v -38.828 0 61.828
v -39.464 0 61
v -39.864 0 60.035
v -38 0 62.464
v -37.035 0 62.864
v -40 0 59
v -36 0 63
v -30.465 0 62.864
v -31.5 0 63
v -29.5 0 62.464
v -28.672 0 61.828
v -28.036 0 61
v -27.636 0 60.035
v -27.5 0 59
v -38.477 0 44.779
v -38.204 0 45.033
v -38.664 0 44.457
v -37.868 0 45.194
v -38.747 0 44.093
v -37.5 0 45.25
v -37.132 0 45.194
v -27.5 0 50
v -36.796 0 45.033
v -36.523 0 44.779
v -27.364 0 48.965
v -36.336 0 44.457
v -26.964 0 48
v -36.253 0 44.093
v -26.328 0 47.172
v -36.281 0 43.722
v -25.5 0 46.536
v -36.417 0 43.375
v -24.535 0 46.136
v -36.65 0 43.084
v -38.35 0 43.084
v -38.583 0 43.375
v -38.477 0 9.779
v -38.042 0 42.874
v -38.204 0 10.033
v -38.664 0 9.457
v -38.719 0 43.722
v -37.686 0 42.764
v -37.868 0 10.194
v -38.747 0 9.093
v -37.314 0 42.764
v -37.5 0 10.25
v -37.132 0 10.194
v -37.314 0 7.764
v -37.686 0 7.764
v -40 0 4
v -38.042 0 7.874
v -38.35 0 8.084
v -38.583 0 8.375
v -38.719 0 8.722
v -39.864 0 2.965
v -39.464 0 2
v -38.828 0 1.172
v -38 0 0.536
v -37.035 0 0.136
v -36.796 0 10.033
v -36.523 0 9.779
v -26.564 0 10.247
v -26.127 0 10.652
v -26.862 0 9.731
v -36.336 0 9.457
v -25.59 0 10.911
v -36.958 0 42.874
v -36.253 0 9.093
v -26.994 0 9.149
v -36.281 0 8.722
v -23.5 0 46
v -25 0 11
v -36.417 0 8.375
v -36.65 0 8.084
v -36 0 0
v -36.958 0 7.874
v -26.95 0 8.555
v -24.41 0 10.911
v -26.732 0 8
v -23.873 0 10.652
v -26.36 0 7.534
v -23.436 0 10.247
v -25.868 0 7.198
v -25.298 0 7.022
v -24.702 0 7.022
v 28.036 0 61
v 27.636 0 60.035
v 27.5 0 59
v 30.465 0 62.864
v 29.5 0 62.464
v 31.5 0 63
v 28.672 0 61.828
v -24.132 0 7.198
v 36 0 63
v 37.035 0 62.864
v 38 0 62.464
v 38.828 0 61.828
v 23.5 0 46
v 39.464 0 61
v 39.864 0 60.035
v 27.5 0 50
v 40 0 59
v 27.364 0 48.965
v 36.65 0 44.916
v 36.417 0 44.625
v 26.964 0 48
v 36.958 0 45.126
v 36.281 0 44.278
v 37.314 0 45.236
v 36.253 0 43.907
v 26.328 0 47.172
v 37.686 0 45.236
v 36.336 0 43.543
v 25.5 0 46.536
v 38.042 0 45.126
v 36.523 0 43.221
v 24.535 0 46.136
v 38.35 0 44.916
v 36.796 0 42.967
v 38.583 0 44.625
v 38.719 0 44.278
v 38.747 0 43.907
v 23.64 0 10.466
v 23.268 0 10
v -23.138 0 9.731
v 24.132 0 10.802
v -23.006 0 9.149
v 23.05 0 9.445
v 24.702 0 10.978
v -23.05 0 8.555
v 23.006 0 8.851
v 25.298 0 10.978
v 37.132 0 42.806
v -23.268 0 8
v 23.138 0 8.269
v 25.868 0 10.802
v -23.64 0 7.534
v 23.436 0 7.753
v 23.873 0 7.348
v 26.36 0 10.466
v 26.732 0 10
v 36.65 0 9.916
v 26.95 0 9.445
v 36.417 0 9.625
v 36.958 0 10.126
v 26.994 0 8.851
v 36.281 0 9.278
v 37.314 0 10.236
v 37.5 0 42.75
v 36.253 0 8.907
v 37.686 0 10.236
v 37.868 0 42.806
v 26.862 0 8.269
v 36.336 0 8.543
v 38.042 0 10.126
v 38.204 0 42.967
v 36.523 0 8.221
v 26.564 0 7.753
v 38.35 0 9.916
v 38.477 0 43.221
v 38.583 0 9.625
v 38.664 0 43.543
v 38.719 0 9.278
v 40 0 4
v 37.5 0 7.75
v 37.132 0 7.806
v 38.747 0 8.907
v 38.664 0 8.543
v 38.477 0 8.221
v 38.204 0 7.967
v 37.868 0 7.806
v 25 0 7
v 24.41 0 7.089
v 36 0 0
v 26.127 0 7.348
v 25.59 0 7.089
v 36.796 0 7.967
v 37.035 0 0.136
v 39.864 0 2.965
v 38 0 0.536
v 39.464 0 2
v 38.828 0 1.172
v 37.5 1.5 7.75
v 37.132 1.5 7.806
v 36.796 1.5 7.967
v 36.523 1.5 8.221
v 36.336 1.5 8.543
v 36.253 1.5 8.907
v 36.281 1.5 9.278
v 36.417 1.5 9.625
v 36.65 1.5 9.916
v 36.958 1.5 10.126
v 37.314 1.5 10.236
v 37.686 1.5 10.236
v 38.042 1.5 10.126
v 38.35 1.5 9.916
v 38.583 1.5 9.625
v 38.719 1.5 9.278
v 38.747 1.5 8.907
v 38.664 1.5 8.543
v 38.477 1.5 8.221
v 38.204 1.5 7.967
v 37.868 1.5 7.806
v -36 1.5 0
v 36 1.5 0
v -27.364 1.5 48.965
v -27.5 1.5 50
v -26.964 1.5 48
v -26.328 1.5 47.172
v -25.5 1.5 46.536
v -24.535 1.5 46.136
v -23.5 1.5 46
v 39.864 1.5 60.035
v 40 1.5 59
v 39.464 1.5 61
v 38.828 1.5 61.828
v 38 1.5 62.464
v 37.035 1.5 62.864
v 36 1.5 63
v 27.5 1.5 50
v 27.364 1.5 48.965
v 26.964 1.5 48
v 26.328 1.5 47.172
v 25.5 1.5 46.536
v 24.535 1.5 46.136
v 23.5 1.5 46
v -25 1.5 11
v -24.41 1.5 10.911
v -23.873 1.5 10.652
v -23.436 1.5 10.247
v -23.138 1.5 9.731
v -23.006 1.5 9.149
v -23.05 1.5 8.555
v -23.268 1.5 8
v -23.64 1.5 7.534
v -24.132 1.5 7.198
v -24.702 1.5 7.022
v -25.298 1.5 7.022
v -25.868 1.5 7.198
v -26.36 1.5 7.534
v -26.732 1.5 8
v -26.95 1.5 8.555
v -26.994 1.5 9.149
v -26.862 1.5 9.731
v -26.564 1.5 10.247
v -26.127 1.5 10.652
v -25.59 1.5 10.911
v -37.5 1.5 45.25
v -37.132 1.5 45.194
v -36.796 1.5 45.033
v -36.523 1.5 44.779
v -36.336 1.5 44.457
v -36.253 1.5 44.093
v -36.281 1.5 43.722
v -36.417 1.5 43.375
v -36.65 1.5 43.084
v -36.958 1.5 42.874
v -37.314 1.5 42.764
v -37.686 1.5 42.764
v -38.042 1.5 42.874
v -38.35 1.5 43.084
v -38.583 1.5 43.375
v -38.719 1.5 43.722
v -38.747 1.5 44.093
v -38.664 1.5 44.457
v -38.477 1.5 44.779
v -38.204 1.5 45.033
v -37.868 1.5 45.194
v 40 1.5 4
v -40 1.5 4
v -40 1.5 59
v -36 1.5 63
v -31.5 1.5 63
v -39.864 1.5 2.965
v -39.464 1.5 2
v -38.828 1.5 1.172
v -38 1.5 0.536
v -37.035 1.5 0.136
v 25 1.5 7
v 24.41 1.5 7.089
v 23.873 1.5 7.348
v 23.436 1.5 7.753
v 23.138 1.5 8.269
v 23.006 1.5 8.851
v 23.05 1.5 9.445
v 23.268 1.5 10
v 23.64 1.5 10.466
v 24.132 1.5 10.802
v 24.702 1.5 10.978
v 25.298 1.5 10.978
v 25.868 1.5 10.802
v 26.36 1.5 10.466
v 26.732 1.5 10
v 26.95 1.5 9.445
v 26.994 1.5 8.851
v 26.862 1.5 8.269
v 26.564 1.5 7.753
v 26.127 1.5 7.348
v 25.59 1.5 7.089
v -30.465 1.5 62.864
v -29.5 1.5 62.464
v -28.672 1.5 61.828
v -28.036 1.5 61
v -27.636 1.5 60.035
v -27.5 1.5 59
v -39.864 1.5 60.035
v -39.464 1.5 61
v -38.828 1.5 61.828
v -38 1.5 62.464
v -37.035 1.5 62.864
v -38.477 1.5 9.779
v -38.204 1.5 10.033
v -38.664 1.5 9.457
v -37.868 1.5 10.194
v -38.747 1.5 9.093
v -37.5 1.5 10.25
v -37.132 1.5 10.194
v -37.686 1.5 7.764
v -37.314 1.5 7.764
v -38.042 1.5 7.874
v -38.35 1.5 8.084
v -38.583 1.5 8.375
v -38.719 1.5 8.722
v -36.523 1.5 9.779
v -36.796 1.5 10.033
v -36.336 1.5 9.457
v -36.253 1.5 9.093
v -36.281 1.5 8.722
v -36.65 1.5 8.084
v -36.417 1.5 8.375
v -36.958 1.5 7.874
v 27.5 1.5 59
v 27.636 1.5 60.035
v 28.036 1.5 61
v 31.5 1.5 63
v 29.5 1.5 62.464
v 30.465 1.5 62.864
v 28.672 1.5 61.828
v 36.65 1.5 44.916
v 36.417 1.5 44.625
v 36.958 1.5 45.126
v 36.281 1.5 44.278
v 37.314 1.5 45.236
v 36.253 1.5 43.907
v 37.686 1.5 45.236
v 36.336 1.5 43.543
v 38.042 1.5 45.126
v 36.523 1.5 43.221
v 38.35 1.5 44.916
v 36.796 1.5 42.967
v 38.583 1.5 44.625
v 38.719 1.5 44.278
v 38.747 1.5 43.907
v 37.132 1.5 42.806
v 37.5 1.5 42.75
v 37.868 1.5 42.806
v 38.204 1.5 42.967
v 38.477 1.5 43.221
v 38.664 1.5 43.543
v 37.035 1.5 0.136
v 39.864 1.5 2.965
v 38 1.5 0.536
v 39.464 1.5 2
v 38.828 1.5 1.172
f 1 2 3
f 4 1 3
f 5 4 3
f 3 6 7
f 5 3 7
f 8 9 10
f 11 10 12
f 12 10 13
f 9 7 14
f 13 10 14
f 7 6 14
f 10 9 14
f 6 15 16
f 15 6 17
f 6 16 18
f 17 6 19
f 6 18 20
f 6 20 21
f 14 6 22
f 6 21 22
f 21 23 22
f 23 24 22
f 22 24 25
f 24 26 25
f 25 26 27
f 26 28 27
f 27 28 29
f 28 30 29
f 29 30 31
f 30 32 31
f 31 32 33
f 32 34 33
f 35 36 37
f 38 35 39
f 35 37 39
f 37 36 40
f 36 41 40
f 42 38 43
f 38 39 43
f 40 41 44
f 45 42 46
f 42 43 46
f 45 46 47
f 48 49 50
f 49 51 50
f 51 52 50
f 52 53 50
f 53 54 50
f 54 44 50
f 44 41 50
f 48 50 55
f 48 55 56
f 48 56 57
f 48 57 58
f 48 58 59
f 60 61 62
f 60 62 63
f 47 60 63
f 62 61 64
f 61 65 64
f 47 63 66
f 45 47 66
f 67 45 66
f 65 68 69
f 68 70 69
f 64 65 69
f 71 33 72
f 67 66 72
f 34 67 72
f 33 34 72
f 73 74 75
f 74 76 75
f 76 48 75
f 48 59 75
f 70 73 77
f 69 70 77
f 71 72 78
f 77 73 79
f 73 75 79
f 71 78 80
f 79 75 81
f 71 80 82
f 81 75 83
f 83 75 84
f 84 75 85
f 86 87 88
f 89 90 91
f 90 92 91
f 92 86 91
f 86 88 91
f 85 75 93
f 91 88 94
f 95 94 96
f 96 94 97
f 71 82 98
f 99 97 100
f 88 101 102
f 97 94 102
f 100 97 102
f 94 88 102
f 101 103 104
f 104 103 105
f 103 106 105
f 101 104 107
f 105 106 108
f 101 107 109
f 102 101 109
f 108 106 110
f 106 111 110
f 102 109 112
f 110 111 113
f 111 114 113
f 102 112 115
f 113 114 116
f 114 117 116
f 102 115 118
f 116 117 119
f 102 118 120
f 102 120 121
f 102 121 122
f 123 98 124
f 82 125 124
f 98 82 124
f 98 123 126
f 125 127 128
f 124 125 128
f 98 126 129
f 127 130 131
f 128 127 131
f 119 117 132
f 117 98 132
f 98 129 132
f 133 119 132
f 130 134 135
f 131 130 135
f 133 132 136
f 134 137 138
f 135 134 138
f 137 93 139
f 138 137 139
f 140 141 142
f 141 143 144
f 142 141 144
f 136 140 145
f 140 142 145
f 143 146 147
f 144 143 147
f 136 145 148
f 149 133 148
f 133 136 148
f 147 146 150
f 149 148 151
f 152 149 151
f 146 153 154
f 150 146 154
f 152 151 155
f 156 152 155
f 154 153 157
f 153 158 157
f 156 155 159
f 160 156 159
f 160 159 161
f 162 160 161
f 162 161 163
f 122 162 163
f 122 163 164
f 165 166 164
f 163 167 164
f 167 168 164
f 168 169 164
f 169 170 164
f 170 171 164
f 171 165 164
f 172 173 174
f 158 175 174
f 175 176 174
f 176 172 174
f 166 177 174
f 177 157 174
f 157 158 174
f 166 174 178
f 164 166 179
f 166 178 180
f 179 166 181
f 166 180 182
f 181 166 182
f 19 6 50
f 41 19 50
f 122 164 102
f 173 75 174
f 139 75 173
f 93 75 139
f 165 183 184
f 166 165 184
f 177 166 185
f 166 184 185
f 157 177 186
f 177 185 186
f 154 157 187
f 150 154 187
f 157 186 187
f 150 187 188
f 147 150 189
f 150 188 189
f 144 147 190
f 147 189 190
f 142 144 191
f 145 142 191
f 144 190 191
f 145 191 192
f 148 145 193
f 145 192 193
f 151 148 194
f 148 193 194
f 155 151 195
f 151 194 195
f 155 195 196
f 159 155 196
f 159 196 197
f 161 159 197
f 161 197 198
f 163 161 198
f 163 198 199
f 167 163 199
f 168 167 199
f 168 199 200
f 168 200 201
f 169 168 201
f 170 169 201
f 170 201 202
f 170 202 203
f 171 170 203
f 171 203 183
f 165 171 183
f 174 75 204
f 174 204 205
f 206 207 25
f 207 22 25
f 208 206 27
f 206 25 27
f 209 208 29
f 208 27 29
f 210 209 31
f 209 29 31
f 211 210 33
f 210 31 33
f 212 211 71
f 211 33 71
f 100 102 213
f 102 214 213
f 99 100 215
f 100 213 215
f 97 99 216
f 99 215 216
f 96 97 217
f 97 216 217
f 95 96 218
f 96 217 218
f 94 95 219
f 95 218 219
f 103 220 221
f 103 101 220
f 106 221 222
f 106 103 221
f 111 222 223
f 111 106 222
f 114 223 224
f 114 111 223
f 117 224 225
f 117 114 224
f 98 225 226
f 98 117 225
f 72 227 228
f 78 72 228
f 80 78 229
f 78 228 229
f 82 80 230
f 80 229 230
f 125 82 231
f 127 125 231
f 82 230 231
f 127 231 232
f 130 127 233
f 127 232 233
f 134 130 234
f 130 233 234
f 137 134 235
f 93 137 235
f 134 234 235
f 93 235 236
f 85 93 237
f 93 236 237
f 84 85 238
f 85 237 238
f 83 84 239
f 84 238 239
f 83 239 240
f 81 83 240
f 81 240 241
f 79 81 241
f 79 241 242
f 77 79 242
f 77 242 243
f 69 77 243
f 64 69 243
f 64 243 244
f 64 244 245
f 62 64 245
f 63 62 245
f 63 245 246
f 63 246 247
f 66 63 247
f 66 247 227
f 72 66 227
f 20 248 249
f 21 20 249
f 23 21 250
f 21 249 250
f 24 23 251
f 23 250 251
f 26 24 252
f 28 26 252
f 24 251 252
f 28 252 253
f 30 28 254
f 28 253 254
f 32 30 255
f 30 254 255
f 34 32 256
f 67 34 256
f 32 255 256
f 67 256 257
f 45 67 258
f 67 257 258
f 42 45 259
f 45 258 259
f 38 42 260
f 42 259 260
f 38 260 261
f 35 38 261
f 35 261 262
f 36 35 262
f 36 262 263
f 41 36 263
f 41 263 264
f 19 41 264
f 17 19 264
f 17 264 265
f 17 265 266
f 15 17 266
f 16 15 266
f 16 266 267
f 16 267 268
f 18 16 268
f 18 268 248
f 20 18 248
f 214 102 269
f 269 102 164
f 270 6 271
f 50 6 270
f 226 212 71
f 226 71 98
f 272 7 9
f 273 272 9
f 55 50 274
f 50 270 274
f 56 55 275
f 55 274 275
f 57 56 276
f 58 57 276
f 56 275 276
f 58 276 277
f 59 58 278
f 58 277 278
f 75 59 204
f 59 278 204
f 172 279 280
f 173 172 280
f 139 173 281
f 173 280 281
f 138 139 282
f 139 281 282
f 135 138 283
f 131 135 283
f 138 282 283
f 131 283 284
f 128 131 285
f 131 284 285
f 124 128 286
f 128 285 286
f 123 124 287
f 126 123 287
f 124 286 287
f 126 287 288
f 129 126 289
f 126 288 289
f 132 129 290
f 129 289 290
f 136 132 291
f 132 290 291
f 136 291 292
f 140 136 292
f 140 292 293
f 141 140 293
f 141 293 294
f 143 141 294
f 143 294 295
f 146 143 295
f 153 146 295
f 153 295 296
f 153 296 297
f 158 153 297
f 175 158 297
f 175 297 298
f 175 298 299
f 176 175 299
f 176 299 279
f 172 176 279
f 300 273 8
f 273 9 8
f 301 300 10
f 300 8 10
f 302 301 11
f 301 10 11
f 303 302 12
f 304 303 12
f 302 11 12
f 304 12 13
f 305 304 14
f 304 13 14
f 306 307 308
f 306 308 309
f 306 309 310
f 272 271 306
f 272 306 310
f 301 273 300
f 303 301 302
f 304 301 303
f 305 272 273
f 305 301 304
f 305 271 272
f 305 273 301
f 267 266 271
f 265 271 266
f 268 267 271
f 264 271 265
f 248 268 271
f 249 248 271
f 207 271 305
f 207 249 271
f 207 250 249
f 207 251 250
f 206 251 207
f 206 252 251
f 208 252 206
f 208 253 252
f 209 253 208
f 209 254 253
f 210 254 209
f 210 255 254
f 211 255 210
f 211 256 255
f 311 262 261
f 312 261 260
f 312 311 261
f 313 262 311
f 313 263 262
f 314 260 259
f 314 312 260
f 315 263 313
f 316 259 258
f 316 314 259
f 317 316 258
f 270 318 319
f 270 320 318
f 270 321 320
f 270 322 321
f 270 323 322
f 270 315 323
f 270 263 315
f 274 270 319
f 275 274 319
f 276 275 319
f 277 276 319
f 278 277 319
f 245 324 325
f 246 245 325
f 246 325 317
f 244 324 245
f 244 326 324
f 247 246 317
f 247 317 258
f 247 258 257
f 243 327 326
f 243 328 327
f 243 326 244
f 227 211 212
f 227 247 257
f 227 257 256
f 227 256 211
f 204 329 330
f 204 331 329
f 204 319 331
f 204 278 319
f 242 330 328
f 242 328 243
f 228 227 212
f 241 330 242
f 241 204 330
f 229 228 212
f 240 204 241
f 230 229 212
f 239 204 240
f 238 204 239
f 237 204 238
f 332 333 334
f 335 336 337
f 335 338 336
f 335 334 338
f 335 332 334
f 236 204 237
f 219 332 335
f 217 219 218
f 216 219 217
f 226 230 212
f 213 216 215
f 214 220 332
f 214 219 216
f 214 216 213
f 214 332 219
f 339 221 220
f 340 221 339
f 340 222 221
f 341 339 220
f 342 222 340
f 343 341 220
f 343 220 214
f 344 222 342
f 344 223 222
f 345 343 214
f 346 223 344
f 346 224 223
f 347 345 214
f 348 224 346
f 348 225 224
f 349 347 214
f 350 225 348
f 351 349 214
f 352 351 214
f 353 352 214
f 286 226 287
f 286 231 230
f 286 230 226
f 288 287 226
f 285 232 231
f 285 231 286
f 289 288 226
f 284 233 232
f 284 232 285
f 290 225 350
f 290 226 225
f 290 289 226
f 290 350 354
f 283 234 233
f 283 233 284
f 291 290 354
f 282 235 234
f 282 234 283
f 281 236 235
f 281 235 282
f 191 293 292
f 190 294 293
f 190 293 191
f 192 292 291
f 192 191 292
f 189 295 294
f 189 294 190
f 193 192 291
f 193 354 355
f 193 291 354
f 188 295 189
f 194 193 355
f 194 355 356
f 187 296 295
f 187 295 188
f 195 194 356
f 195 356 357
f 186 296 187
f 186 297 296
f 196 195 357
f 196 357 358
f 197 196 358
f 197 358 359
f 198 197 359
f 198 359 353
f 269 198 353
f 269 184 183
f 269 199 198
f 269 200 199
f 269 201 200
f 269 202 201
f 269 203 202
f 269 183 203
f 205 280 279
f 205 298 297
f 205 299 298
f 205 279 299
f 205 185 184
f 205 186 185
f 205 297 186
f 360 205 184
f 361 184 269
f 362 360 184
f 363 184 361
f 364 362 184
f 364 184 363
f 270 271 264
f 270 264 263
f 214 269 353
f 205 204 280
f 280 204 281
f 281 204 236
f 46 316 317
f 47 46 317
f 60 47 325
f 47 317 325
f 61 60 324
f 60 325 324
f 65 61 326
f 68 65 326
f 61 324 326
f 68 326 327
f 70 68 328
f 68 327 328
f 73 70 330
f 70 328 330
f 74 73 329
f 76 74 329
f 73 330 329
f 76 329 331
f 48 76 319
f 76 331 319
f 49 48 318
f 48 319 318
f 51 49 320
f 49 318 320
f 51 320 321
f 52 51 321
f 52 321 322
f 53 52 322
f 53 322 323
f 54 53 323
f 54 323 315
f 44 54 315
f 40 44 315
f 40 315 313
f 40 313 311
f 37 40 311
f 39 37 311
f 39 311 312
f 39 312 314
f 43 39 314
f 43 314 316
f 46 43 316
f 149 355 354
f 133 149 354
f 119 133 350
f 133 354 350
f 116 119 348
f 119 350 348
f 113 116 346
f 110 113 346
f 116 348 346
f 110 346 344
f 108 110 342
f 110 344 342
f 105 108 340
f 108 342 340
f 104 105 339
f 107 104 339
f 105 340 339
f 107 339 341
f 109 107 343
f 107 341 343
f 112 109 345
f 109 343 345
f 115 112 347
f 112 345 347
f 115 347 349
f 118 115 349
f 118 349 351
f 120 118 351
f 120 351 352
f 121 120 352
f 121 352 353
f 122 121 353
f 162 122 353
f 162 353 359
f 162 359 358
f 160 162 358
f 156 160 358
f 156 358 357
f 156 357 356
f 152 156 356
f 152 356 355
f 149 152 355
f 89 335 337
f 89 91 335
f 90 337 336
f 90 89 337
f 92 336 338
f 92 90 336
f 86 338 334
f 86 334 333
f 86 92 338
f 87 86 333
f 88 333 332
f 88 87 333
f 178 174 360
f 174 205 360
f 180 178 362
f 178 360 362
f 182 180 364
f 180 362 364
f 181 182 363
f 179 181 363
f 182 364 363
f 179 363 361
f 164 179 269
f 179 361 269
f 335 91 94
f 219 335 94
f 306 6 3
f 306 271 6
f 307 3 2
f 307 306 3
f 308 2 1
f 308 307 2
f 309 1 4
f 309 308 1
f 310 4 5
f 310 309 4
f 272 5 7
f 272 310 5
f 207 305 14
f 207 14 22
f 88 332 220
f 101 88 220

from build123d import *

# Parameters (mm, degrees)
ESQUISSE1_W             = 80
ESQUISSE1_H             = 63
BOSS_EXTRU_1_DEPTH      = 1.5
ESQUISSE2_R             = 1.25
ESQUISSE2_R_2           = 2
ESQUISSE2_W             = 55
ESQUISSE2_H             = 17
ENL_V_MAT_EXTRU_1_DEPTH = 75.640806534
CONG_1_R                = 4


with BuildPart() as part:
    # Esquisse1 → Boss.-Extru.1 (new body)
    with BuildSketch(Plane(origin=(0, 0, 0), x_dir=(1, 0, 0), z_dir=(0, 1, 0))):
        with Locations((0, -31.5)):
            Rectangle(ESQUISSE1_W, ESQUISSE1_H)
    extrude(amount=BOSS_EXTRU_1_DEPTH)

    # Esquisse2 → Enlèv. mat.-Extru.1 (cut, through all)
    with BuildSketch(Plane(origin=(0, 1.5, 0), x_dir=(1, 0, 0), z_dir=(0, 1, 0))):
        with Locations(Location((-37.5, -44, 0), (0, 0, 270))):
            Circle(ESQUISSE2_R)
        with Locations(Location((-37.5, -9, 0), (0, 0, 270))):
            Circle(ESQUISSE2_R)
        with Locations(Location((-25, -9, 0), (0, 0, 270))):
            Circle(ESQUISSE2_R_2)
        with Locations(Location((25, -9, 0), (0, 0, 90))):
            Circle(ESQUISSE2_R_2)
        with Locations(Location((37.5, -9, 0), (0, 0, 90))):
            Circle(ESQUISSE2_R)
        with Locations(Location((37.5, -44, 0), (0, 0, 90))):
            Circle(ESQUISSE2_R)
        with Locations((0, -54.5)):
            Rectangle(ESQUISSE2_W, ESQUISSE2_H)
    extrude(amount=-ENL_V_MAT_EXTRU_1_DEPTH, mode=Mode.SUBTRACT)

    # Congé1
    cong_1_edges = [part.edges().sort_by_distance(p)[0] for p in [
        (-27.5, 0.75, 63),
        (-27.5, 0.75, 46),
        (27.5, 0.75, 46),
        (27.5, 0.75, 63),
        (-40, 0.75, 0),
        (40, 0.75, 0),
        (40, 0.75, 63),
        (-40, 0.75, 63),
    ]]
    fillet(cong_1_edges, radius=CONG_1_R)


solid = part.part
